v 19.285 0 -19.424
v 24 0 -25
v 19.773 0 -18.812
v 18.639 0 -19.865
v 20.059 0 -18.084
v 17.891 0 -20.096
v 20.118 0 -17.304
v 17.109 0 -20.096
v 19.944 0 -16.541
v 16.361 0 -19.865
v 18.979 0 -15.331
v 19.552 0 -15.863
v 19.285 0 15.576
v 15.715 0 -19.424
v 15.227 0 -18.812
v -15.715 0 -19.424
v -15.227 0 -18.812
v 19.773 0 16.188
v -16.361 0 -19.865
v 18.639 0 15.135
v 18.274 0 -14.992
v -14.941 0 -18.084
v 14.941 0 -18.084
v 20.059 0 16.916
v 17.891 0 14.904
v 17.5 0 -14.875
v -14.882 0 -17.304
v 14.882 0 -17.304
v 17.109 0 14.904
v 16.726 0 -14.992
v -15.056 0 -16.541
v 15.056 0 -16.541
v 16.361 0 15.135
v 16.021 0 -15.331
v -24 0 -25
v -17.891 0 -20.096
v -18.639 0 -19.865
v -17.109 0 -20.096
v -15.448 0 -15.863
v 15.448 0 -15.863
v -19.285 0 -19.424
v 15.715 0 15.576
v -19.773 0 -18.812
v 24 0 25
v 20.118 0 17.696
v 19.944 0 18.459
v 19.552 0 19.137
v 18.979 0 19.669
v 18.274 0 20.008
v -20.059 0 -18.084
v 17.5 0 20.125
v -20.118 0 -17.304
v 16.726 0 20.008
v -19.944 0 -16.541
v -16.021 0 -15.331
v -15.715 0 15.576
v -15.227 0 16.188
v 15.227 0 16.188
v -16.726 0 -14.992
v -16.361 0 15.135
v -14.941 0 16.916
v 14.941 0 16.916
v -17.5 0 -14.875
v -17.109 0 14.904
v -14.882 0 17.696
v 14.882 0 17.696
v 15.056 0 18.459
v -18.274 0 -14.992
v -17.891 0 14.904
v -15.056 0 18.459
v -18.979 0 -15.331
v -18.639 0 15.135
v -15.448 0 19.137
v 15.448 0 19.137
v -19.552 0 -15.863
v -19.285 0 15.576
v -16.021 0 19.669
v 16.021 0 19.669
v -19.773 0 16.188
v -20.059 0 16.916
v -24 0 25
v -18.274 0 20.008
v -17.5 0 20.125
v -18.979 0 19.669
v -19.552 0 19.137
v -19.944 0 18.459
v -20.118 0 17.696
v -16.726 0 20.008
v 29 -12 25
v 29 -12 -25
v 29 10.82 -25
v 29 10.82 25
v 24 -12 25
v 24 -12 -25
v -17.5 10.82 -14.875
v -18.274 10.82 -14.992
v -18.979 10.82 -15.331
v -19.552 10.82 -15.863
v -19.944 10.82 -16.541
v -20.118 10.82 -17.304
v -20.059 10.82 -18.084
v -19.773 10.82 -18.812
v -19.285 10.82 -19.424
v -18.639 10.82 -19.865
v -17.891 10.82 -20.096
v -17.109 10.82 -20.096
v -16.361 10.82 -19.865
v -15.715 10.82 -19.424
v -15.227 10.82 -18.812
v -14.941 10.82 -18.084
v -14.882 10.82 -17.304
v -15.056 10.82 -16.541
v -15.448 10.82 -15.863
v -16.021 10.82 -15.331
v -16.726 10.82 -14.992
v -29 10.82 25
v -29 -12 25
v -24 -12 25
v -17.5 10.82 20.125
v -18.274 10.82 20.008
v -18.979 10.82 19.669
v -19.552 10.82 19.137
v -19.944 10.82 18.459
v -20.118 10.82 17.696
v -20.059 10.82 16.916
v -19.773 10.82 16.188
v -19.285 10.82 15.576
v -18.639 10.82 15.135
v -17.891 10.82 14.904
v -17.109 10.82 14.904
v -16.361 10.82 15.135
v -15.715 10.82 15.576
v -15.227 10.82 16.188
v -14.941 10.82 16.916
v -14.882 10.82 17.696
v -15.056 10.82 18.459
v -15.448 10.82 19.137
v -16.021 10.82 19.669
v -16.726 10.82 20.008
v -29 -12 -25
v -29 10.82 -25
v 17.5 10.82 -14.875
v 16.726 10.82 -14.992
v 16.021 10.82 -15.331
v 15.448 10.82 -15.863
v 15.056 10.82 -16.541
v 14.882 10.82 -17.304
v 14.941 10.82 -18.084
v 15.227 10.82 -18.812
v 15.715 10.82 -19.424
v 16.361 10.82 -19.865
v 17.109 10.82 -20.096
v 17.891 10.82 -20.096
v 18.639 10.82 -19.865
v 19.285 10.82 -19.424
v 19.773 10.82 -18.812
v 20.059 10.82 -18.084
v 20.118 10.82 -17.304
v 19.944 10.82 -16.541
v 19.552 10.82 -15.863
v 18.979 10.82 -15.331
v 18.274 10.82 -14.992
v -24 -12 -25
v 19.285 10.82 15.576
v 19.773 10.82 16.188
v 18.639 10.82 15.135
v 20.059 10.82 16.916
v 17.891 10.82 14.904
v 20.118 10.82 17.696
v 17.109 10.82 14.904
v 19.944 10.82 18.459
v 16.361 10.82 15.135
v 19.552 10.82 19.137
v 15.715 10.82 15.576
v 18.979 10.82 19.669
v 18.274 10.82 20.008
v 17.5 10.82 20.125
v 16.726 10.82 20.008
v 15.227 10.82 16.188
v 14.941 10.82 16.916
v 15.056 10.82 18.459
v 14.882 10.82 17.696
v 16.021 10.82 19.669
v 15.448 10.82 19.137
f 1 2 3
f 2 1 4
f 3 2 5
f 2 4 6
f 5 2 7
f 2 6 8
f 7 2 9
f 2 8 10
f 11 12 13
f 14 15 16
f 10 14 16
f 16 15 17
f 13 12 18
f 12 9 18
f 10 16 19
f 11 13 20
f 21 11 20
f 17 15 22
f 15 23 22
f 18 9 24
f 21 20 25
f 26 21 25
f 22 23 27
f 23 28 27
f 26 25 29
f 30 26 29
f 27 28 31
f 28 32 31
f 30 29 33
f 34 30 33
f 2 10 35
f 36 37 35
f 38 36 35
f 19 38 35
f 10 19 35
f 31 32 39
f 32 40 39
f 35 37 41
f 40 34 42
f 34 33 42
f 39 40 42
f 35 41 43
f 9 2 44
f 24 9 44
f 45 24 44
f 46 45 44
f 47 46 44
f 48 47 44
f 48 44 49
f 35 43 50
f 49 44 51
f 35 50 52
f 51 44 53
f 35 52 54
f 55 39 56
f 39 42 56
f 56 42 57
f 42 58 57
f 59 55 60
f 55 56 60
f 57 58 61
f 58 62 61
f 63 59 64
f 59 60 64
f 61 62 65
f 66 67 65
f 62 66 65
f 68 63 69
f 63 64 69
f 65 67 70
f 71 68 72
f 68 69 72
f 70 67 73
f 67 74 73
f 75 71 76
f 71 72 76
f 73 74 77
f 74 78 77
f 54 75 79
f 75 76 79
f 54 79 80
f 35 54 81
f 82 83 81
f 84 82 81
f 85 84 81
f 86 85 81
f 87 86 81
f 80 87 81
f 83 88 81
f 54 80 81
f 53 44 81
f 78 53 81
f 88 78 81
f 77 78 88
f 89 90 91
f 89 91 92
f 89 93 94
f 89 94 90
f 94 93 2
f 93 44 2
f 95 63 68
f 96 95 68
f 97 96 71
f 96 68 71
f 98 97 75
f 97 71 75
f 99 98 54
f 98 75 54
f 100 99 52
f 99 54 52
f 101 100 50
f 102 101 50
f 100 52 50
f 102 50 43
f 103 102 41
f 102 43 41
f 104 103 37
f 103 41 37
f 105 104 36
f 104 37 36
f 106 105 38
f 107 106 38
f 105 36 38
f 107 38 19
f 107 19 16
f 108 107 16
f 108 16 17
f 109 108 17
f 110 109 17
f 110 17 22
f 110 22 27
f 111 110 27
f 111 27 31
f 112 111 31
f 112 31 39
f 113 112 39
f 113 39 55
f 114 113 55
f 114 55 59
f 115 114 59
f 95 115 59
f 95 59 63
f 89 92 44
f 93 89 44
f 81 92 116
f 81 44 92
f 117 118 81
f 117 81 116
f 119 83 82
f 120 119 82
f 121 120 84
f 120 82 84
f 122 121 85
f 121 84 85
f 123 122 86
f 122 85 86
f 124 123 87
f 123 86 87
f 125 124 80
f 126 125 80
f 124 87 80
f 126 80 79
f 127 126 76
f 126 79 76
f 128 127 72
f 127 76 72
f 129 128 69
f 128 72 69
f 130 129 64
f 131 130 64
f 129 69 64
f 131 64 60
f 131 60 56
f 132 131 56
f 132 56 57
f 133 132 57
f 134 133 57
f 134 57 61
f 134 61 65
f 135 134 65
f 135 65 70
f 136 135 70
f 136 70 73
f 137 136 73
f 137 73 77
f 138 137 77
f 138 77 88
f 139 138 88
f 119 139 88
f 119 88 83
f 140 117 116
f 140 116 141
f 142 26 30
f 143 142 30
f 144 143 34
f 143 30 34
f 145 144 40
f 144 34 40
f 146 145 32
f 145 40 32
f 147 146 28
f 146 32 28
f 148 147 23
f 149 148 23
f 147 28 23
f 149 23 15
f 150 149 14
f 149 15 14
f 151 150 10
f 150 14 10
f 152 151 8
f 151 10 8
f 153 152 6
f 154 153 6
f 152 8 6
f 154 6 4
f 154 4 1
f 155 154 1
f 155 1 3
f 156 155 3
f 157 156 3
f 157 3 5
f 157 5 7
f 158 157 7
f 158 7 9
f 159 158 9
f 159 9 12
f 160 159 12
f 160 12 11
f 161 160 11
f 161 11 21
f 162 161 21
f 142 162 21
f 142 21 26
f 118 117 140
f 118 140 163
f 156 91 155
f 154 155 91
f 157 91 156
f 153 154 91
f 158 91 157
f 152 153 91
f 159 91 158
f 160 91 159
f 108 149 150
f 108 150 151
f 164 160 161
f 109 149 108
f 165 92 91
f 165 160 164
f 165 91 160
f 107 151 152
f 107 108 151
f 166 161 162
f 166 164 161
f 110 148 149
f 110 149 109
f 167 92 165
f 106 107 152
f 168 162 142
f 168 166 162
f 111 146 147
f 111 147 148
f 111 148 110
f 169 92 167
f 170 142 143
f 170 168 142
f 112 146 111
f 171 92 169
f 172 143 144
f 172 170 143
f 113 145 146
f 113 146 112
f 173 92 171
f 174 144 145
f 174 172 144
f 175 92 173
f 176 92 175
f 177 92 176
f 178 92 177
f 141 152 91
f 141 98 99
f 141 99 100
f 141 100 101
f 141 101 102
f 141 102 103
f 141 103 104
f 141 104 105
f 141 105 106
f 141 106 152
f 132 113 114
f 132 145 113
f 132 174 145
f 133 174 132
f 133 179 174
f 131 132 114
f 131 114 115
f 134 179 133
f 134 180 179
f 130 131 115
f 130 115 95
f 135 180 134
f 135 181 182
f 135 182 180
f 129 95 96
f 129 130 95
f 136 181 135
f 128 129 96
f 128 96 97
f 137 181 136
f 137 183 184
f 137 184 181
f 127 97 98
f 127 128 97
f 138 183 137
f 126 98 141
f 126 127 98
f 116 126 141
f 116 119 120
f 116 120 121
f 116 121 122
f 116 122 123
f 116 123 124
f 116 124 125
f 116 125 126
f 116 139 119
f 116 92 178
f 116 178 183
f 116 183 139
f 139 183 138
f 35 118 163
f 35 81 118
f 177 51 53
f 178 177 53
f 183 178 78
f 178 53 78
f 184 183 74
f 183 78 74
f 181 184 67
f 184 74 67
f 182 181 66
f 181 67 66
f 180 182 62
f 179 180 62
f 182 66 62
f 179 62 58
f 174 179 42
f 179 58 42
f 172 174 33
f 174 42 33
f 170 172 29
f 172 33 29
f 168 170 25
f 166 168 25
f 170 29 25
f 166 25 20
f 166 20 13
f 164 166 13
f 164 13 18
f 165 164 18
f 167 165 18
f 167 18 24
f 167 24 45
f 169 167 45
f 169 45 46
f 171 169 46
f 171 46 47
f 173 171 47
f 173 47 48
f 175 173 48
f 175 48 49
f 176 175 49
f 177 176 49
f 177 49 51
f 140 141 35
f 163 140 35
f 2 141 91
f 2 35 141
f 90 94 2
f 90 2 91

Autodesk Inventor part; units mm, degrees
ref_plane "YZ Plane" through (0, 0, 0) normal (1, 0, 0) x (0, 1, 0)
ref_plane "XZ Plane" through (0, 0, 0) normal (0, 1, 0) x (-1, 0, 0)
ref_plane "XY Plane" through (0, 0, 0) normal (0, 0, 1) x (1, 0, 0)
sketch "Sketch1" plane through (0, 0, 0) normal (0, 1, 0) x (-1, 0, 0)
  line L0 (29, -25) -> (-29, -25)
  line L1 (-29, -25) -> (-29, 25)
  line L2 (-29, 25) -> (29, 25)
  line L3 (29, 25) -> (29, -25)
  line L4 (29, -25) -> (-29, 25) construction
  line L5 (-29, -25) -> (29, 25) construction
  point P0 (0, 0)
  dimension "d0" = 58
  dimension "d1" = 50
extrude "Extrusion1" add sketch "Sketch1" along normal blind 10.8204
sketch "Sketch2" plane through (0, 0, 0) normal (0, -1, 0) x (1, 0, 0)
  line L0 (-29, -25) -> (29, -25) projected
  line L1 (29, -25) -> (29, 25) projected
  line L2 (29, 25) -> (-29, 25) projected
  line L3 (-29, 25) -> (-29, -25) projected
  line L4 (-24, 25) -> (-24, -25)
  line L5 (24, 25) -> (24, -25)
  point P0 (0, 0)
  dimension "d4" = 5
  dimension "d5" = 5
extrude "Extrusion2" add sketch "Sketch2" along normal blind 12 contours L3 L2 L4 L0 | L5 L2 L1 L0
sketch "Sketch3" plane through (0, 10.8204, 0) normal (0, 1, 0) x (1, 0, 0)
  line L0 (29, 25) -> (-29, 25) projected
  line L1 (-29, 25) -> (-29, -25) projected
  point P0 (0, 0)
  point P1 (-17.5, 17.5)
  point P2 (17.5, 17.5)
  point P3 (-17.5, -17.5)
  point P4 (17.5, -17.5)
  dimension "d10" = 35
  dimension "d13" = 35
  dimension "d16" = 11.5
  dimension "d17" = 58
  dimension "d18" = 50
  dimension "d19" = 7.5
hole "Hole1" at (-17.5, 10.8204, -17.5) at (17.5, 10.8204, -17.5) at (-17.5, 10.8204, 17.5) at (17.5, 10.8204, 17.5) direction (0, -1, 0) diameter 5.25 end through all
equation "\"d5\" = d4"
equation "\"d16\" = -0.5 * d10 + 0.5 * d17"
equation "\"d19\" = -0.5 * d13 + 0.5 * d18"
properties part number "sbr20uu_standoff"
